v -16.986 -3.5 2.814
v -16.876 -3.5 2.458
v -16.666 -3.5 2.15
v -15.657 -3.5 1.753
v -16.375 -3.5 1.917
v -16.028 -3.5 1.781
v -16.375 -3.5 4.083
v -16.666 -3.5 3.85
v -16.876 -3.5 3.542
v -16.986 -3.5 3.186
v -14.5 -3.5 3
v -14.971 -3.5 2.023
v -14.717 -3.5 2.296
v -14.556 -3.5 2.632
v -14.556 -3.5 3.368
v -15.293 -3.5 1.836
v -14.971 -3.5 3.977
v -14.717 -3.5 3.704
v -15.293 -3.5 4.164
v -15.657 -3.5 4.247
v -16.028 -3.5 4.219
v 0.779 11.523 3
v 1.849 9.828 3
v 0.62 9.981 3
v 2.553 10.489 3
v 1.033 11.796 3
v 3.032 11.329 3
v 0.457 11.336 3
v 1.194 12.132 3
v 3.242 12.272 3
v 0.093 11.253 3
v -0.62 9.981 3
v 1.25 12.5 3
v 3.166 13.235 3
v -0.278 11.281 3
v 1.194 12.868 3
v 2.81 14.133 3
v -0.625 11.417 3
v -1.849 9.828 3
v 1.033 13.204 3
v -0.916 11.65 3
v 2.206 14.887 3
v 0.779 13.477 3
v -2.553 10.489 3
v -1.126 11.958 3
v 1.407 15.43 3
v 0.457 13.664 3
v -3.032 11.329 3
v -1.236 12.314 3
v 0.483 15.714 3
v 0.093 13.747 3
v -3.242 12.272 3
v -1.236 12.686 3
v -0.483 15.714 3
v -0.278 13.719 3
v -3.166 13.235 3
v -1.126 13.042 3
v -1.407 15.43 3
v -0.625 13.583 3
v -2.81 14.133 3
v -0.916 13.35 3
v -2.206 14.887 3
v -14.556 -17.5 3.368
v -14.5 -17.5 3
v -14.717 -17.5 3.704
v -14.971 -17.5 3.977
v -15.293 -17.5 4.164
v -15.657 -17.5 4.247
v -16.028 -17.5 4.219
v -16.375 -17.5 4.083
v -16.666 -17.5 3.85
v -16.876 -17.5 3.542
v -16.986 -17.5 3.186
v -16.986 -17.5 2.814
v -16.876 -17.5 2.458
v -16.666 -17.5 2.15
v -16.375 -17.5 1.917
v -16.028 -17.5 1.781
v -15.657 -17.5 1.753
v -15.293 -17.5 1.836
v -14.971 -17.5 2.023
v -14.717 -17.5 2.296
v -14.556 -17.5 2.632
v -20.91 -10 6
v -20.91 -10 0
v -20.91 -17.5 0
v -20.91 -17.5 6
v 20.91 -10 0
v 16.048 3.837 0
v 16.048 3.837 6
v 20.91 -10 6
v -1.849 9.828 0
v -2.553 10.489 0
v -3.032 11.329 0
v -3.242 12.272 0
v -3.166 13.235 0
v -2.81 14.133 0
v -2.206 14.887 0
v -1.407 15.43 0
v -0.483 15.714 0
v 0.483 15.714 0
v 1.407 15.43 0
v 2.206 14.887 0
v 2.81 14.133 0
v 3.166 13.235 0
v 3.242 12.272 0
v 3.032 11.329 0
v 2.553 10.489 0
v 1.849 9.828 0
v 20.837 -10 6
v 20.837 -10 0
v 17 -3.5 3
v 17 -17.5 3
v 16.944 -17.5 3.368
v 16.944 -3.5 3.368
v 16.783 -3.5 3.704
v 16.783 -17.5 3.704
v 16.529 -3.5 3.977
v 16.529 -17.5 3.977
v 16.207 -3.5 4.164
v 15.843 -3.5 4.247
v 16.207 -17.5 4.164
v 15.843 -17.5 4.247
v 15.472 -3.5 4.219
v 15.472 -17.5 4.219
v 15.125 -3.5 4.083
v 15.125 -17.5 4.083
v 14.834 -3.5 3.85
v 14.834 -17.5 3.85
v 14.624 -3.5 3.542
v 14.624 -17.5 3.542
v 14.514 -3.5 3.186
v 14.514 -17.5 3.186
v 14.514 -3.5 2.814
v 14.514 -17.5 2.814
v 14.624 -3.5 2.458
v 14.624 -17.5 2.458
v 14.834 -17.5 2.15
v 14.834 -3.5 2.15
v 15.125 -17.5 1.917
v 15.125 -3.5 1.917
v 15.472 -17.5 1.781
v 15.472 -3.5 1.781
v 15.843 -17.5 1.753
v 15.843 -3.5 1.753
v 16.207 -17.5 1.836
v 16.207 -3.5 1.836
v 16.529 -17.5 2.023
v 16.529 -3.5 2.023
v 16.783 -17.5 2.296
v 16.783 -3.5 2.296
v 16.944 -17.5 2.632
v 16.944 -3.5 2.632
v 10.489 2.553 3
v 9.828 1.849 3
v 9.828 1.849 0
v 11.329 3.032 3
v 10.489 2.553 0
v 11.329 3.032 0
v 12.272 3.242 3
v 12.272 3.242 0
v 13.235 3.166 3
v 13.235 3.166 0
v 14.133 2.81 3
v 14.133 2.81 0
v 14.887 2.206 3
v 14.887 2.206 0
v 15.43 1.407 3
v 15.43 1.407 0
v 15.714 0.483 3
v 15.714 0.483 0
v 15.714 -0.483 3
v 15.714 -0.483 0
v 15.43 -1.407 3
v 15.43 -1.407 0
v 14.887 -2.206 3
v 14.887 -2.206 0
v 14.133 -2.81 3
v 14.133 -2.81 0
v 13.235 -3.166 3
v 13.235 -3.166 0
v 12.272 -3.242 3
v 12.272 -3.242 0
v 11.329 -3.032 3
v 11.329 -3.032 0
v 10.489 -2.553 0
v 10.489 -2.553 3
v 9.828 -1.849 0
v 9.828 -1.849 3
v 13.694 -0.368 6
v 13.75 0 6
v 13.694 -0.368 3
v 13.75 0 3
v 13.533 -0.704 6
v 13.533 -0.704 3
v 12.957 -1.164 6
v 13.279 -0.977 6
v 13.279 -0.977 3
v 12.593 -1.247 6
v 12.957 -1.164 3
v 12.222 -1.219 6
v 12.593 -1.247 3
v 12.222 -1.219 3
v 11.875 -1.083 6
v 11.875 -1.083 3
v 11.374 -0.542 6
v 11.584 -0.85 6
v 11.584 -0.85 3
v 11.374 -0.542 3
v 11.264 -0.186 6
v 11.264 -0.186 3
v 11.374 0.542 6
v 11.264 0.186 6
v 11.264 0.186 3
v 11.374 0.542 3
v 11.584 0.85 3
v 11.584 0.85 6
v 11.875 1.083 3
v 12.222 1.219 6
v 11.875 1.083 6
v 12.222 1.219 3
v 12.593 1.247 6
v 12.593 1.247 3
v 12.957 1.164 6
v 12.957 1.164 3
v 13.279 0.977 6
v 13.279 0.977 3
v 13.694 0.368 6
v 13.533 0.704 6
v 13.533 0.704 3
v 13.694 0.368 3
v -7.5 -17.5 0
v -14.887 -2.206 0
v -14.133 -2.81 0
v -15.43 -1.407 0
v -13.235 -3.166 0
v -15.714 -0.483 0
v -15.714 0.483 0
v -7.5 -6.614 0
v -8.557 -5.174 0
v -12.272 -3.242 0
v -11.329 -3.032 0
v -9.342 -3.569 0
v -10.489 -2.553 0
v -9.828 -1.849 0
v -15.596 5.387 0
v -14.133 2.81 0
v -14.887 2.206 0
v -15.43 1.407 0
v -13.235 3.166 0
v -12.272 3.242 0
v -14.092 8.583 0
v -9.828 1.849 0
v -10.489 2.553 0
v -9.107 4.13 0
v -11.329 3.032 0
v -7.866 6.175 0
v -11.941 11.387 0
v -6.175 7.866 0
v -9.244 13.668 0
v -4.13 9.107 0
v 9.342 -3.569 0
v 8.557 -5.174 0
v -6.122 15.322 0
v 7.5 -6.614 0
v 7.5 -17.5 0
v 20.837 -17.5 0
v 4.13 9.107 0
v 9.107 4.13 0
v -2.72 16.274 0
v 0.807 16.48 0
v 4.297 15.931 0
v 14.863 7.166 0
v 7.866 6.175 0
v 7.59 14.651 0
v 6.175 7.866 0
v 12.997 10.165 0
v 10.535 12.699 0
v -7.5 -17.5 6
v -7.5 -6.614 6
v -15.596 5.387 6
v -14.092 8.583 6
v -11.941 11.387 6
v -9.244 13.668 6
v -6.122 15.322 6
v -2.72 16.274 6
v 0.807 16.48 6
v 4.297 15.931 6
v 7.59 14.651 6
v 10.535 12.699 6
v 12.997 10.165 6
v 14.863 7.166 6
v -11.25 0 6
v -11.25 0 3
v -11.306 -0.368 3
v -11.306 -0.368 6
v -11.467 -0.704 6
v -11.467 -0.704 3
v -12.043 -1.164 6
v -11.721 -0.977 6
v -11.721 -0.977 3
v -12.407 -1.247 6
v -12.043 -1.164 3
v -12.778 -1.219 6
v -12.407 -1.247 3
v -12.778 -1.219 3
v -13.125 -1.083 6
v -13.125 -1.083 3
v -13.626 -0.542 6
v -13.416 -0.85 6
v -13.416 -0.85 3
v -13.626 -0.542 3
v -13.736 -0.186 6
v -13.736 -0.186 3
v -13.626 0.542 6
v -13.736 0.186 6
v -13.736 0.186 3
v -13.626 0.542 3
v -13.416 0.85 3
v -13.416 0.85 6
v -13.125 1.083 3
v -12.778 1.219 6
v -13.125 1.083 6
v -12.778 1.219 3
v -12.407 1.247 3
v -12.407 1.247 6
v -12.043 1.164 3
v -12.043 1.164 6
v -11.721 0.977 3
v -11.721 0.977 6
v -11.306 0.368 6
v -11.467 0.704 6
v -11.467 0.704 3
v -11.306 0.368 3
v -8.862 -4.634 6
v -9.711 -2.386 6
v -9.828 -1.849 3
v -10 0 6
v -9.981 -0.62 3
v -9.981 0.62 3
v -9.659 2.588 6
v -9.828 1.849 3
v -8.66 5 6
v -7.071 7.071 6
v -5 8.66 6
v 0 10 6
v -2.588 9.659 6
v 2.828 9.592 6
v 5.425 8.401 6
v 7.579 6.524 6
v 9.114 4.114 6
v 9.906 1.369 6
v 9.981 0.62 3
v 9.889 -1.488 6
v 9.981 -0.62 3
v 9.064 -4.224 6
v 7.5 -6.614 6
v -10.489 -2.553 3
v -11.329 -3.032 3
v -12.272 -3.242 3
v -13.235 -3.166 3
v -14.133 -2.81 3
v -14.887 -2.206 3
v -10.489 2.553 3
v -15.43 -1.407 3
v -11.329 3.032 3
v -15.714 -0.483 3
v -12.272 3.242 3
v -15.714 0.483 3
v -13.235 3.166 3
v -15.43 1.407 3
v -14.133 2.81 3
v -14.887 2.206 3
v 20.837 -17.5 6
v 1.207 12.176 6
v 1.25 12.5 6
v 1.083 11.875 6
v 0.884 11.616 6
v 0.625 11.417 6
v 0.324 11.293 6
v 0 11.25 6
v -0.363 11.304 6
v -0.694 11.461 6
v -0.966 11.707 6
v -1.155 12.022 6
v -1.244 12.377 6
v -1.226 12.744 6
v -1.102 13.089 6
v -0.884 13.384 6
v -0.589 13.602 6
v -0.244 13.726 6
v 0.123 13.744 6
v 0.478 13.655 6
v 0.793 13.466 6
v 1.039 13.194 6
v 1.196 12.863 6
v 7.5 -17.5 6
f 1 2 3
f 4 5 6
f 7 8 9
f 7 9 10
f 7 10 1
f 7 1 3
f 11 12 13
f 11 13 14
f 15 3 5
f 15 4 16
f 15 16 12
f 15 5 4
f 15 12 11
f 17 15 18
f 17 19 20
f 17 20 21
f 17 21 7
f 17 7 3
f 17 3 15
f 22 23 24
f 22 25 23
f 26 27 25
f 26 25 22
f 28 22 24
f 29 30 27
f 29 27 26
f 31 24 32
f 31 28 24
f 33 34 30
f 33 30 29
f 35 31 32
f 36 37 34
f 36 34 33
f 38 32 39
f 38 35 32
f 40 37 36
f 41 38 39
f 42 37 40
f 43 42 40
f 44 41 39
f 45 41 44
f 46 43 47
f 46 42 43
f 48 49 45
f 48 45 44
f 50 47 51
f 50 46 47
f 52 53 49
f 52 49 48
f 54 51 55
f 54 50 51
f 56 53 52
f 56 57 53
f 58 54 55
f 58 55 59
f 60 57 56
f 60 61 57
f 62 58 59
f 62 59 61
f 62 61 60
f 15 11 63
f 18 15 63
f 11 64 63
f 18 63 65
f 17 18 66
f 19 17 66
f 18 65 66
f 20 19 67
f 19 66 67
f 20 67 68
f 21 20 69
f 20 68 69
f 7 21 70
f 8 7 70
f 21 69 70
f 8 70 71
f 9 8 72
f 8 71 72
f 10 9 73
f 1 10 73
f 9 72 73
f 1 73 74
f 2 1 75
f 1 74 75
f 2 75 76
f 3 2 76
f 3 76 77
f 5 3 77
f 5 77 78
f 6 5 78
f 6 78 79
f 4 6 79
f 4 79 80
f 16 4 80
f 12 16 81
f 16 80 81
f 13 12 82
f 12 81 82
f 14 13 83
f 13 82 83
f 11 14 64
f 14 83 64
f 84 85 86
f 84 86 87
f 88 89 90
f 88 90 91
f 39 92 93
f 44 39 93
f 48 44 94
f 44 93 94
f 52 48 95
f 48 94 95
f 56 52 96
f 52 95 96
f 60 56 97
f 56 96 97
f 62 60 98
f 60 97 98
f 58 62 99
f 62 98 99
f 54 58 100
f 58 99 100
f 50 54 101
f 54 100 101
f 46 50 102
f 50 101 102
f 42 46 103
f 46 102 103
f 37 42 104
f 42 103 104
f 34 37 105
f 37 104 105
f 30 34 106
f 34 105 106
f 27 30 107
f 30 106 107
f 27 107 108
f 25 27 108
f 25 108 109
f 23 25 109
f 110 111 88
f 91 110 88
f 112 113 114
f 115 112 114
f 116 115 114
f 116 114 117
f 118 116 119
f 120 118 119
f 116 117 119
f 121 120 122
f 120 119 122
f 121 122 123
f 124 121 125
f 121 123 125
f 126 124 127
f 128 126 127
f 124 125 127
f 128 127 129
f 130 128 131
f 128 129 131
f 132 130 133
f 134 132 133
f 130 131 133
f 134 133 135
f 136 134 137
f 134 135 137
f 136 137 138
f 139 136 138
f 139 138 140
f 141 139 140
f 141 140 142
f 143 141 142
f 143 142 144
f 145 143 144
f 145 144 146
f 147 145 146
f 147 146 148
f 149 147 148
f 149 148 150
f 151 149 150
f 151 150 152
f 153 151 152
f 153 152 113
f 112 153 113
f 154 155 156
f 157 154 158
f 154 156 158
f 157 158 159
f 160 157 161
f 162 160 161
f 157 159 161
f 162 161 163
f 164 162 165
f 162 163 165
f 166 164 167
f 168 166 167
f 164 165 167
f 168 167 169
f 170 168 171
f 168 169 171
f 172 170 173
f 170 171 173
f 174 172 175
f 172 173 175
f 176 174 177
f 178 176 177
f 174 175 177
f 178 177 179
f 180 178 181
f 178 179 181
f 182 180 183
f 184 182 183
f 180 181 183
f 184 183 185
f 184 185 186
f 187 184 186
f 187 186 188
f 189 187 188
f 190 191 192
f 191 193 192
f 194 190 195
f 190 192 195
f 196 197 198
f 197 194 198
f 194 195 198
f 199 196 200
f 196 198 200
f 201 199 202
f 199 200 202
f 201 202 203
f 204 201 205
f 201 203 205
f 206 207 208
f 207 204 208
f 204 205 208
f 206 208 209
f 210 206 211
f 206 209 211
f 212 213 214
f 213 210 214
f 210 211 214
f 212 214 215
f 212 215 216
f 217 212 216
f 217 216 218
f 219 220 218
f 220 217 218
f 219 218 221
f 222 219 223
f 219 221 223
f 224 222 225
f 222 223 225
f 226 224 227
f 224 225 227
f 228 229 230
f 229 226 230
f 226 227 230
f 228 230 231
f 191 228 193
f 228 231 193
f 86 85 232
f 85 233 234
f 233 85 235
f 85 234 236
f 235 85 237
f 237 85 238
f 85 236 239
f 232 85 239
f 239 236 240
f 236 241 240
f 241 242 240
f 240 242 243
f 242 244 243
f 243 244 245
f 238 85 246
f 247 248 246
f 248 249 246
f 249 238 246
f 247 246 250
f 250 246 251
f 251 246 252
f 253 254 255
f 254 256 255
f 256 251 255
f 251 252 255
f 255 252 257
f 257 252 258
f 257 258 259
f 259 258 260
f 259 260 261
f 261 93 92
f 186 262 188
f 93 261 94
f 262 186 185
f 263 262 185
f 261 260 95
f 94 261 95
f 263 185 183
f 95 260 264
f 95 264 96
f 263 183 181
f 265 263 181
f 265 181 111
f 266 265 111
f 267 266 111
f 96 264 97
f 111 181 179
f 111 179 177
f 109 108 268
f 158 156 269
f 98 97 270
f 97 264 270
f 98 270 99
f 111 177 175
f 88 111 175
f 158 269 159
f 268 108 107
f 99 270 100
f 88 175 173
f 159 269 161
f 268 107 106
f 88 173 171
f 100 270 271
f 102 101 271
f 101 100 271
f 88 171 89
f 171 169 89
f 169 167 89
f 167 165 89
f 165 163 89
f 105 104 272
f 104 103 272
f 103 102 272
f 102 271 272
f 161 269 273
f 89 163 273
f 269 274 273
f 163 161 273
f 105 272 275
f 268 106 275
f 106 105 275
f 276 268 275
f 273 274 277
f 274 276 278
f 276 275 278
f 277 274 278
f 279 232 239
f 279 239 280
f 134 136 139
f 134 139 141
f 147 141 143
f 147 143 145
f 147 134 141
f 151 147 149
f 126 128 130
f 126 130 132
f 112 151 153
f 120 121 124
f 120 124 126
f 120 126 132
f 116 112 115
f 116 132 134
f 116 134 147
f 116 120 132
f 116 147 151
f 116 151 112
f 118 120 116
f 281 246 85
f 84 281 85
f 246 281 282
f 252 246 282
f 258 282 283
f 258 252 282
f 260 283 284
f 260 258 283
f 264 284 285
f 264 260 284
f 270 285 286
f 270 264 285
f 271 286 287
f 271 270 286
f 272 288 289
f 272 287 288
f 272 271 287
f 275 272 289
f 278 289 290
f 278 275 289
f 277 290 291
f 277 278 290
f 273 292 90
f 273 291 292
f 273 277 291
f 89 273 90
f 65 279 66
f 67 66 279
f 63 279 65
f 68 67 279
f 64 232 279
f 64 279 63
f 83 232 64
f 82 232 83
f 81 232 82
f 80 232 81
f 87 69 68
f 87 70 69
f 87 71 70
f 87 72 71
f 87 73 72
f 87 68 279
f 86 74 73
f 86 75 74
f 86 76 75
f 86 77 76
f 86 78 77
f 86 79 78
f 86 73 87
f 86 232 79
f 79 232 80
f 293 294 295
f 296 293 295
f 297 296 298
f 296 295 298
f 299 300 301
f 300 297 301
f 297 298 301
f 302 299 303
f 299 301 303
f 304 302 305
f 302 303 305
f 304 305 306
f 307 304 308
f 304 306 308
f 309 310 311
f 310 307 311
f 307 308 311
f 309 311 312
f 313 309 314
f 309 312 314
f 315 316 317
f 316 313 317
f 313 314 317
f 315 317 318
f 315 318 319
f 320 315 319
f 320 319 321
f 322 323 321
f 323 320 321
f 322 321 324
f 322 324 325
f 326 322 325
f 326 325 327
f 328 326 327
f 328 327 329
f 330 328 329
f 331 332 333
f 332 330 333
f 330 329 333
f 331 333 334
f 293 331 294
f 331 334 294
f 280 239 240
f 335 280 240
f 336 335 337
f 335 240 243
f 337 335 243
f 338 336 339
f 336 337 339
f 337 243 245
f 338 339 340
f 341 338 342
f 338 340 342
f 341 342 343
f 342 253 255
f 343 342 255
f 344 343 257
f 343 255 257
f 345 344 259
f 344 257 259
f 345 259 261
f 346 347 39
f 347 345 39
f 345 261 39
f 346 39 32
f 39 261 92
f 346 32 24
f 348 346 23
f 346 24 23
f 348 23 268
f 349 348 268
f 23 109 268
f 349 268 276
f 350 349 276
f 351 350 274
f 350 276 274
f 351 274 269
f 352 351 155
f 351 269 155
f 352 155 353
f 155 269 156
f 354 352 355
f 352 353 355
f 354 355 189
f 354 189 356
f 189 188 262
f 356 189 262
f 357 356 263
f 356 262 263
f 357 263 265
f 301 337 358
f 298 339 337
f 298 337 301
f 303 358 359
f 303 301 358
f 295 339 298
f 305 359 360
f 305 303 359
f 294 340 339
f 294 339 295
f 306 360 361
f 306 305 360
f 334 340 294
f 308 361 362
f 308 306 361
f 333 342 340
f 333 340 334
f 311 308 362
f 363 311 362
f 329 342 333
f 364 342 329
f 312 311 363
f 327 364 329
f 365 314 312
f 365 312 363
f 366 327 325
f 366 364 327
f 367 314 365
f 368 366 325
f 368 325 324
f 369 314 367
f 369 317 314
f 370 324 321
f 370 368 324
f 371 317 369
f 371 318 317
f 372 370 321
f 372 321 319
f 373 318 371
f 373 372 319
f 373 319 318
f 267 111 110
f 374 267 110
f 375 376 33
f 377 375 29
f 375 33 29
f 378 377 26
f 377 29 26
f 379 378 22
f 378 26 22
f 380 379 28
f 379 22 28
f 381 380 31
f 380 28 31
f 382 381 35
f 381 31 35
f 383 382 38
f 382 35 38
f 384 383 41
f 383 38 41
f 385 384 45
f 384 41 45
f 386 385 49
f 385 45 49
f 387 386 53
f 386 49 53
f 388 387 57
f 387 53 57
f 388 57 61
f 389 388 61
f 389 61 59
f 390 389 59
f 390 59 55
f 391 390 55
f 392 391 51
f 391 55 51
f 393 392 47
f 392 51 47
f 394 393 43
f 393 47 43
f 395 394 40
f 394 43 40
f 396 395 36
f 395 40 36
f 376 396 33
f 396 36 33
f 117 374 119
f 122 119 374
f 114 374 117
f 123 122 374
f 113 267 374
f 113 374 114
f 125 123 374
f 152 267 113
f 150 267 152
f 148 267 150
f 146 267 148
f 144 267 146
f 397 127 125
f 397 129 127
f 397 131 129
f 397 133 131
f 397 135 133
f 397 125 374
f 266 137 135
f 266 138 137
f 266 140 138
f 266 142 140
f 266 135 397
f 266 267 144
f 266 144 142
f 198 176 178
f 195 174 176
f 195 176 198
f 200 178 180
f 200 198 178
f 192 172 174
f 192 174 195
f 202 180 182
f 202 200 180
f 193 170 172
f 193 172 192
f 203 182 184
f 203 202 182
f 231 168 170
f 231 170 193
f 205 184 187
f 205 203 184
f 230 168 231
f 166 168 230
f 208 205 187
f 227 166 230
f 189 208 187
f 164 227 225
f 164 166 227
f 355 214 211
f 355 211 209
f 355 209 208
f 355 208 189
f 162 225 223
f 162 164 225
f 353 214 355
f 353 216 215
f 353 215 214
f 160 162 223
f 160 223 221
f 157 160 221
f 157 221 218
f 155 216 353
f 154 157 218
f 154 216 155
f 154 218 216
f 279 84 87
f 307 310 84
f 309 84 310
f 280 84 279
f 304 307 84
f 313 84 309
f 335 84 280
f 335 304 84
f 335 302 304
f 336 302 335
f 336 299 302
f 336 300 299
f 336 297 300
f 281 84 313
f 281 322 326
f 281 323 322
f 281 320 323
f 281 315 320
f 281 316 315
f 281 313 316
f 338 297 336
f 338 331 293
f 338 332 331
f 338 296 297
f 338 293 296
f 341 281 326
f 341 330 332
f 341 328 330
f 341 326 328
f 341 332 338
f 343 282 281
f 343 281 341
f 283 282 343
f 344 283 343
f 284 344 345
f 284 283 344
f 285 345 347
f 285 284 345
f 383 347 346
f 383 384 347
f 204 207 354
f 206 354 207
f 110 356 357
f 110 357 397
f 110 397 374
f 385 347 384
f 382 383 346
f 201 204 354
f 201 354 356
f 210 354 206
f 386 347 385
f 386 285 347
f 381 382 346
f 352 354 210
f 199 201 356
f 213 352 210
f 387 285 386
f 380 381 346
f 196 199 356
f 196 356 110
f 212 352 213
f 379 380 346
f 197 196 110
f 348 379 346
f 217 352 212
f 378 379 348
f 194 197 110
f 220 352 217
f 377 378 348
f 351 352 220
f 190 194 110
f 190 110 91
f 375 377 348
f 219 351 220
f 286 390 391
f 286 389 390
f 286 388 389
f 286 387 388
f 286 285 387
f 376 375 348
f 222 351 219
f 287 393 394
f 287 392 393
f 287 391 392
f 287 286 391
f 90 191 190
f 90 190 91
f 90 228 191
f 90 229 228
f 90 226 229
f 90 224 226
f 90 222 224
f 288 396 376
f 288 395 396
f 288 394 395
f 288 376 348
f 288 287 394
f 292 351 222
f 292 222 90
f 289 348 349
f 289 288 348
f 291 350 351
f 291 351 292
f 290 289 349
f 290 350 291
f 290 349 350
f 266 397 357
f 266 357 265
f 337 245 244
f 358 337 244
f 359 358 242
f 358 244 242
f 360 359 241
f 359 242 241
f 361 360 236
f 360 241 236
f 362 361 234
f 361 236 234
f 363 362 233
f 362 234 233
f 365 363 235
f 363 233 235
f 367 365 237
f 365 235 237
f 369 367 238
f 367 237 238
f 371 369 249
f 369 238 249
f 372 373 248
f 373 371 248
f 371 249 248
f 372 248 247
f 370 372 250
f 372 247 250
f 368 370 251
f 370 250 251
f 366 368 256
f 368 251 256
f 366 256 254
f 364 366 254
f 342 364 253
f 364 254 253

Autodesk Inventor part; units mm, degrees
ref_plane "YZ Plane" through (0, 0, 0) normal (1, 0, 0) x (0, 1, 0)
ref_plane "XZ Plane" through (0, 0, 0) normal (0, 1, 0) x (-1, 0, 0)
ref_plane "XY Plane" through (0, 0, 0) normal (0, 0, 1) x (1, 0, 0)
sketch "Sketch1" plane through (0, 0, 0) normal (0, 0, 1) x (1, 0, 0)
  circle A0 centre (0, 0) radius 10
  arc A1 (13.1244, -10) -> (-13.1244, -10) centre (0, 0) ccw
  line L0 (13.1244, -10) -> (25, -10)
  line L1 (25, -10) -> (0, -10)
  line L2 (-13.1244, -10) -> (-25, -10)
  line L3 (0, 0) -> (0, -17.5)
  line L4 (0, -17.5) -> (-25, -17.5)
  line L5 (-25, -17.5) -> (-25, -10)
  line L6 (25, -10) -> (25, -17.5)
  line L7 (25, -17.5) -> (0, -17.5)
  line L8 (0, 0) -> (-12.5, 0)
  circle A2 centre (-12.5, 0) radius 1.25
  line L9 (0, 0) -> (0, 12.5)
  circle A3 centre (0, 12.5) radius 1.25
  circle A4 centre (12.5, 0) radius 1.25
  circle A5 centre (0, -12.5) radius 1.25
  circle A6 centre (12.5, 0) radius 3.25
  circle A7 centre (-12.5, 0) radius 3.25
  line L10 (0, 0) -> (2.11, 2.11)
  line L11 (0, 0) -> (2.984, 0) construction
  circle A8 centre (0, 12.5) radius 3.25
  circle A9 centre (0, -12.5) radius 3.25
  dimension "d0" = 20
  dimension "d1" = 33
  dimension "d2" = 25
  dimension "d3" = 25
  dimension "d4" = 17.5
  dimension "d5" = 25
  dimension "d6" = 12.5
  dimension "d7" = 2.5
  dimension "d8" = 12.5
  dimension "d9" = 2.5
  dimension "d15" = 6.5
  dimension "d16" = 45
  dimension "d17" = 6.5
  dimension "d18" = 6.5
extrude "Extrusion1" add sketch "Sketch1" along normal blind 6 contours A0 A6 | A0 A8 A7 A9 L3 L4 L5 L2 A1 L1 A6 | A0 A8 | A9 L1 A0 | L3 A5 A9 A0 | L1 A9 L3 A5 | L1 L0 L6 L7 L3 A9 | A5 L3 | L3 A5 | A0 A7 picked at (10.6028, 1.4923)
fillet "Fillet1" radius 5 2 edges at (13.1244, -10, 3) (-13.1244, -10, 3)
sketch "Sketch2" plane through (0, 0, 0) normal (0, 0, -1) x (-1, 0, 0)
  circle A0 centre (0, 12.5) radius 1.25 projected
  line L0 (0, 0) -> (-3.0567, 0)
  circle A1 centre (0, -12.5) radius 1.25
extrude "Extrusion2" cut sketch "Sketch2" against normal blind 10 contours A1
sketch "Sketch3" plane through (0, 0, 0) normal (0, 0, -1) x (-1, 0, 0)
  circle A0 centre (-12.5, 0) radius 1.25 projected
  circle A1 centre (0, -12.5) radius 1.25 projected
  circle A2 centre (0, 0) radius 10 projected
  circle A3 centre (-12.5, 0) radius 1.25 projected
  circle A4 centre (0, 12.5) radius 1.25 projected
  circle A5 centre (12.5, 0) radius 1.25 projected
  line L0 (25, -17.5) -> (-25, -17.5) projected
  line L1 (25, -10) -> (25, -17.5) projected
  line L2 (20.9105, -10) -> (25, -10) projected
  arc A6 (16.0476, -3.8372) -> (20.9105, -10) centre (20.9105, -5) ccw projected
  arc A7 (16.0476, -3.8372) -> (-16.0476, -3.8372) centre (0, 0) ccw projected
  arc A8 (-20.9105, -10) -> (-16.0476, -3.8372) centre (-20.9105, -5) ccw projected
  line L3 (-25, -10) -> (-20.9105, -10) projected
  line L4 (-25, -17.5) -> (-25, -10) projected
  circle A9 centre (-12.5, 0) radius 3.25
  circle A10 centre (0, 12.5) radius 3.25
  circle A11 centre (12.5, 0) radius 1.25 projected
  circle A12 centre (12.5, 0) radius 3.25
  circle A13 centre (0, -12.5) radius 3.25
  dimension "d19" = 6.5
  dimension "d20" = 6.5
  dimension "d21" = 6.5
  dimension "d22" = 6.5
extrude "Extrusion3" cut sketch "Sketch3" against normal blind 3 contours A2 A12 | A2 A12 | A10 A2 | A2 A10 | A13 A2 | A2 A13 | A9 A2 | A2 A9
sketch "Sketch4" plane through (0, 0, 0) normal (0, 0, -1) x (-1, 0, 0)
  arc A0 (16.0476, -3.8372) -> (-16.0476, -3.8372) centre (0, 0) ccw projected
  line L0 (-25, -10) -> (-20.9105, -10) projected
  line L1 (-16.0476, 3.8372) -> (-20.9105, -10)
  line L2 (15.5959, 5.3868) -> (20.9105, -10)
  arc A1 (16.0476, -3.8372) -> (20.9105, -10) centre (20.9105, -5) ccw projected
  arc A2 (-20.9105, -10) -> (-16.0476, -3.8372) centre (-20.9105, -5) ccw projected
extrude "Extrusion4" add sketch "Sketch4" against normal up to surface (6 mm away)
sketch "Sketch5" plane through (-25, -17.5, 0) normal (0, -1, 0) x (1, 0, 0)
  line L0 (0, 6) -> (50, 6) projected
  line L1 (0, 0) -> (50, 0) projected
  circle A0 centre (40.75, 3) radius 1.25
  circle A1 centre (9.25, 3) radius 1.25
  point P0 (25, 0)
  dimension "d27" = 2.5
extrude "Extrusion5" cut sketch "Sketch5" against normal blind 14
sketch "Sketch6" plane through (-25, -17.5, 0) normal (0, -1, 0) x (1, 0, 0)
  circle A0 centre (9.25, 3) radius 1.25 projected
  circle A1 centre (40.75, 3) radius 1.25 projected
  point P0 (25, 0)
  dimension "d30" = 31.5
sketch "Sketch7" plane through (-25, -17.5, 0) normal (0, -1, 0) x (1, 0, 0)
  line L0 (32.5, -8.9217) -> (17.5, -8.9217)
  line L1 (17.5, -8.9217) -> (17.5, 8.9217)
  line L2 (17.5, 8.9217) -> (32.5, 8.9217)
  line L3 (32.5, 8.9217) -> (32.5, -8.9217)
  line L4 (32.5, -8.9217) -> (17.5, 8.9217) construction
  line L5 (17.5, -8.9217) -> (32.5, 8.9217) construction
  point P0 (25, 0)
  dimension "d31" = 15
extrude "Extrusion6" cut sketch "Sketch7" against normal blind 14
sketch "Sketch8" plane through (-25, -10, 6) normal (0, 1, 0) x (1, 0, 0)
  line L0 (9.4041, 6) -> (41.0476, 6) projected
  line L1 (4.0895, 6) -> (4.0895, 0) projected
  line L2 (9.4041, 6) -> (4.0895, 6)
  line L3 (4.0895, 6) -> (4.0895, 0)
  line L4 (4.0895, 0) -> (9.4041, 0)
  line L5 (9.4041, 0) -> (9.4041, 6)
  line L6 (45.8371, 0) -> (50, 0)
  line L7 (50, 0) -> (50, 6)
  line L8 (50, 6) -> (45.8371, 6)
  line L9 (45.8371, 6) -> (45.8371, 0)
  line L10 (0, 0) -> (4.0895, 0)
  line L11 (4.0895, 0) -> (4.0895, 6)
  line L12 (4.0895, 6) -> (0, 6)
  line L13 (0, 6) -> (0, 0)
  point P0 (25, 6)
extrude "Extrusion7" cut sketch "Sketch8" against normal blind 14 contours L1 L10 L13 L12 | L9 L8 L7 L6
properties part number "ROTATION2"
